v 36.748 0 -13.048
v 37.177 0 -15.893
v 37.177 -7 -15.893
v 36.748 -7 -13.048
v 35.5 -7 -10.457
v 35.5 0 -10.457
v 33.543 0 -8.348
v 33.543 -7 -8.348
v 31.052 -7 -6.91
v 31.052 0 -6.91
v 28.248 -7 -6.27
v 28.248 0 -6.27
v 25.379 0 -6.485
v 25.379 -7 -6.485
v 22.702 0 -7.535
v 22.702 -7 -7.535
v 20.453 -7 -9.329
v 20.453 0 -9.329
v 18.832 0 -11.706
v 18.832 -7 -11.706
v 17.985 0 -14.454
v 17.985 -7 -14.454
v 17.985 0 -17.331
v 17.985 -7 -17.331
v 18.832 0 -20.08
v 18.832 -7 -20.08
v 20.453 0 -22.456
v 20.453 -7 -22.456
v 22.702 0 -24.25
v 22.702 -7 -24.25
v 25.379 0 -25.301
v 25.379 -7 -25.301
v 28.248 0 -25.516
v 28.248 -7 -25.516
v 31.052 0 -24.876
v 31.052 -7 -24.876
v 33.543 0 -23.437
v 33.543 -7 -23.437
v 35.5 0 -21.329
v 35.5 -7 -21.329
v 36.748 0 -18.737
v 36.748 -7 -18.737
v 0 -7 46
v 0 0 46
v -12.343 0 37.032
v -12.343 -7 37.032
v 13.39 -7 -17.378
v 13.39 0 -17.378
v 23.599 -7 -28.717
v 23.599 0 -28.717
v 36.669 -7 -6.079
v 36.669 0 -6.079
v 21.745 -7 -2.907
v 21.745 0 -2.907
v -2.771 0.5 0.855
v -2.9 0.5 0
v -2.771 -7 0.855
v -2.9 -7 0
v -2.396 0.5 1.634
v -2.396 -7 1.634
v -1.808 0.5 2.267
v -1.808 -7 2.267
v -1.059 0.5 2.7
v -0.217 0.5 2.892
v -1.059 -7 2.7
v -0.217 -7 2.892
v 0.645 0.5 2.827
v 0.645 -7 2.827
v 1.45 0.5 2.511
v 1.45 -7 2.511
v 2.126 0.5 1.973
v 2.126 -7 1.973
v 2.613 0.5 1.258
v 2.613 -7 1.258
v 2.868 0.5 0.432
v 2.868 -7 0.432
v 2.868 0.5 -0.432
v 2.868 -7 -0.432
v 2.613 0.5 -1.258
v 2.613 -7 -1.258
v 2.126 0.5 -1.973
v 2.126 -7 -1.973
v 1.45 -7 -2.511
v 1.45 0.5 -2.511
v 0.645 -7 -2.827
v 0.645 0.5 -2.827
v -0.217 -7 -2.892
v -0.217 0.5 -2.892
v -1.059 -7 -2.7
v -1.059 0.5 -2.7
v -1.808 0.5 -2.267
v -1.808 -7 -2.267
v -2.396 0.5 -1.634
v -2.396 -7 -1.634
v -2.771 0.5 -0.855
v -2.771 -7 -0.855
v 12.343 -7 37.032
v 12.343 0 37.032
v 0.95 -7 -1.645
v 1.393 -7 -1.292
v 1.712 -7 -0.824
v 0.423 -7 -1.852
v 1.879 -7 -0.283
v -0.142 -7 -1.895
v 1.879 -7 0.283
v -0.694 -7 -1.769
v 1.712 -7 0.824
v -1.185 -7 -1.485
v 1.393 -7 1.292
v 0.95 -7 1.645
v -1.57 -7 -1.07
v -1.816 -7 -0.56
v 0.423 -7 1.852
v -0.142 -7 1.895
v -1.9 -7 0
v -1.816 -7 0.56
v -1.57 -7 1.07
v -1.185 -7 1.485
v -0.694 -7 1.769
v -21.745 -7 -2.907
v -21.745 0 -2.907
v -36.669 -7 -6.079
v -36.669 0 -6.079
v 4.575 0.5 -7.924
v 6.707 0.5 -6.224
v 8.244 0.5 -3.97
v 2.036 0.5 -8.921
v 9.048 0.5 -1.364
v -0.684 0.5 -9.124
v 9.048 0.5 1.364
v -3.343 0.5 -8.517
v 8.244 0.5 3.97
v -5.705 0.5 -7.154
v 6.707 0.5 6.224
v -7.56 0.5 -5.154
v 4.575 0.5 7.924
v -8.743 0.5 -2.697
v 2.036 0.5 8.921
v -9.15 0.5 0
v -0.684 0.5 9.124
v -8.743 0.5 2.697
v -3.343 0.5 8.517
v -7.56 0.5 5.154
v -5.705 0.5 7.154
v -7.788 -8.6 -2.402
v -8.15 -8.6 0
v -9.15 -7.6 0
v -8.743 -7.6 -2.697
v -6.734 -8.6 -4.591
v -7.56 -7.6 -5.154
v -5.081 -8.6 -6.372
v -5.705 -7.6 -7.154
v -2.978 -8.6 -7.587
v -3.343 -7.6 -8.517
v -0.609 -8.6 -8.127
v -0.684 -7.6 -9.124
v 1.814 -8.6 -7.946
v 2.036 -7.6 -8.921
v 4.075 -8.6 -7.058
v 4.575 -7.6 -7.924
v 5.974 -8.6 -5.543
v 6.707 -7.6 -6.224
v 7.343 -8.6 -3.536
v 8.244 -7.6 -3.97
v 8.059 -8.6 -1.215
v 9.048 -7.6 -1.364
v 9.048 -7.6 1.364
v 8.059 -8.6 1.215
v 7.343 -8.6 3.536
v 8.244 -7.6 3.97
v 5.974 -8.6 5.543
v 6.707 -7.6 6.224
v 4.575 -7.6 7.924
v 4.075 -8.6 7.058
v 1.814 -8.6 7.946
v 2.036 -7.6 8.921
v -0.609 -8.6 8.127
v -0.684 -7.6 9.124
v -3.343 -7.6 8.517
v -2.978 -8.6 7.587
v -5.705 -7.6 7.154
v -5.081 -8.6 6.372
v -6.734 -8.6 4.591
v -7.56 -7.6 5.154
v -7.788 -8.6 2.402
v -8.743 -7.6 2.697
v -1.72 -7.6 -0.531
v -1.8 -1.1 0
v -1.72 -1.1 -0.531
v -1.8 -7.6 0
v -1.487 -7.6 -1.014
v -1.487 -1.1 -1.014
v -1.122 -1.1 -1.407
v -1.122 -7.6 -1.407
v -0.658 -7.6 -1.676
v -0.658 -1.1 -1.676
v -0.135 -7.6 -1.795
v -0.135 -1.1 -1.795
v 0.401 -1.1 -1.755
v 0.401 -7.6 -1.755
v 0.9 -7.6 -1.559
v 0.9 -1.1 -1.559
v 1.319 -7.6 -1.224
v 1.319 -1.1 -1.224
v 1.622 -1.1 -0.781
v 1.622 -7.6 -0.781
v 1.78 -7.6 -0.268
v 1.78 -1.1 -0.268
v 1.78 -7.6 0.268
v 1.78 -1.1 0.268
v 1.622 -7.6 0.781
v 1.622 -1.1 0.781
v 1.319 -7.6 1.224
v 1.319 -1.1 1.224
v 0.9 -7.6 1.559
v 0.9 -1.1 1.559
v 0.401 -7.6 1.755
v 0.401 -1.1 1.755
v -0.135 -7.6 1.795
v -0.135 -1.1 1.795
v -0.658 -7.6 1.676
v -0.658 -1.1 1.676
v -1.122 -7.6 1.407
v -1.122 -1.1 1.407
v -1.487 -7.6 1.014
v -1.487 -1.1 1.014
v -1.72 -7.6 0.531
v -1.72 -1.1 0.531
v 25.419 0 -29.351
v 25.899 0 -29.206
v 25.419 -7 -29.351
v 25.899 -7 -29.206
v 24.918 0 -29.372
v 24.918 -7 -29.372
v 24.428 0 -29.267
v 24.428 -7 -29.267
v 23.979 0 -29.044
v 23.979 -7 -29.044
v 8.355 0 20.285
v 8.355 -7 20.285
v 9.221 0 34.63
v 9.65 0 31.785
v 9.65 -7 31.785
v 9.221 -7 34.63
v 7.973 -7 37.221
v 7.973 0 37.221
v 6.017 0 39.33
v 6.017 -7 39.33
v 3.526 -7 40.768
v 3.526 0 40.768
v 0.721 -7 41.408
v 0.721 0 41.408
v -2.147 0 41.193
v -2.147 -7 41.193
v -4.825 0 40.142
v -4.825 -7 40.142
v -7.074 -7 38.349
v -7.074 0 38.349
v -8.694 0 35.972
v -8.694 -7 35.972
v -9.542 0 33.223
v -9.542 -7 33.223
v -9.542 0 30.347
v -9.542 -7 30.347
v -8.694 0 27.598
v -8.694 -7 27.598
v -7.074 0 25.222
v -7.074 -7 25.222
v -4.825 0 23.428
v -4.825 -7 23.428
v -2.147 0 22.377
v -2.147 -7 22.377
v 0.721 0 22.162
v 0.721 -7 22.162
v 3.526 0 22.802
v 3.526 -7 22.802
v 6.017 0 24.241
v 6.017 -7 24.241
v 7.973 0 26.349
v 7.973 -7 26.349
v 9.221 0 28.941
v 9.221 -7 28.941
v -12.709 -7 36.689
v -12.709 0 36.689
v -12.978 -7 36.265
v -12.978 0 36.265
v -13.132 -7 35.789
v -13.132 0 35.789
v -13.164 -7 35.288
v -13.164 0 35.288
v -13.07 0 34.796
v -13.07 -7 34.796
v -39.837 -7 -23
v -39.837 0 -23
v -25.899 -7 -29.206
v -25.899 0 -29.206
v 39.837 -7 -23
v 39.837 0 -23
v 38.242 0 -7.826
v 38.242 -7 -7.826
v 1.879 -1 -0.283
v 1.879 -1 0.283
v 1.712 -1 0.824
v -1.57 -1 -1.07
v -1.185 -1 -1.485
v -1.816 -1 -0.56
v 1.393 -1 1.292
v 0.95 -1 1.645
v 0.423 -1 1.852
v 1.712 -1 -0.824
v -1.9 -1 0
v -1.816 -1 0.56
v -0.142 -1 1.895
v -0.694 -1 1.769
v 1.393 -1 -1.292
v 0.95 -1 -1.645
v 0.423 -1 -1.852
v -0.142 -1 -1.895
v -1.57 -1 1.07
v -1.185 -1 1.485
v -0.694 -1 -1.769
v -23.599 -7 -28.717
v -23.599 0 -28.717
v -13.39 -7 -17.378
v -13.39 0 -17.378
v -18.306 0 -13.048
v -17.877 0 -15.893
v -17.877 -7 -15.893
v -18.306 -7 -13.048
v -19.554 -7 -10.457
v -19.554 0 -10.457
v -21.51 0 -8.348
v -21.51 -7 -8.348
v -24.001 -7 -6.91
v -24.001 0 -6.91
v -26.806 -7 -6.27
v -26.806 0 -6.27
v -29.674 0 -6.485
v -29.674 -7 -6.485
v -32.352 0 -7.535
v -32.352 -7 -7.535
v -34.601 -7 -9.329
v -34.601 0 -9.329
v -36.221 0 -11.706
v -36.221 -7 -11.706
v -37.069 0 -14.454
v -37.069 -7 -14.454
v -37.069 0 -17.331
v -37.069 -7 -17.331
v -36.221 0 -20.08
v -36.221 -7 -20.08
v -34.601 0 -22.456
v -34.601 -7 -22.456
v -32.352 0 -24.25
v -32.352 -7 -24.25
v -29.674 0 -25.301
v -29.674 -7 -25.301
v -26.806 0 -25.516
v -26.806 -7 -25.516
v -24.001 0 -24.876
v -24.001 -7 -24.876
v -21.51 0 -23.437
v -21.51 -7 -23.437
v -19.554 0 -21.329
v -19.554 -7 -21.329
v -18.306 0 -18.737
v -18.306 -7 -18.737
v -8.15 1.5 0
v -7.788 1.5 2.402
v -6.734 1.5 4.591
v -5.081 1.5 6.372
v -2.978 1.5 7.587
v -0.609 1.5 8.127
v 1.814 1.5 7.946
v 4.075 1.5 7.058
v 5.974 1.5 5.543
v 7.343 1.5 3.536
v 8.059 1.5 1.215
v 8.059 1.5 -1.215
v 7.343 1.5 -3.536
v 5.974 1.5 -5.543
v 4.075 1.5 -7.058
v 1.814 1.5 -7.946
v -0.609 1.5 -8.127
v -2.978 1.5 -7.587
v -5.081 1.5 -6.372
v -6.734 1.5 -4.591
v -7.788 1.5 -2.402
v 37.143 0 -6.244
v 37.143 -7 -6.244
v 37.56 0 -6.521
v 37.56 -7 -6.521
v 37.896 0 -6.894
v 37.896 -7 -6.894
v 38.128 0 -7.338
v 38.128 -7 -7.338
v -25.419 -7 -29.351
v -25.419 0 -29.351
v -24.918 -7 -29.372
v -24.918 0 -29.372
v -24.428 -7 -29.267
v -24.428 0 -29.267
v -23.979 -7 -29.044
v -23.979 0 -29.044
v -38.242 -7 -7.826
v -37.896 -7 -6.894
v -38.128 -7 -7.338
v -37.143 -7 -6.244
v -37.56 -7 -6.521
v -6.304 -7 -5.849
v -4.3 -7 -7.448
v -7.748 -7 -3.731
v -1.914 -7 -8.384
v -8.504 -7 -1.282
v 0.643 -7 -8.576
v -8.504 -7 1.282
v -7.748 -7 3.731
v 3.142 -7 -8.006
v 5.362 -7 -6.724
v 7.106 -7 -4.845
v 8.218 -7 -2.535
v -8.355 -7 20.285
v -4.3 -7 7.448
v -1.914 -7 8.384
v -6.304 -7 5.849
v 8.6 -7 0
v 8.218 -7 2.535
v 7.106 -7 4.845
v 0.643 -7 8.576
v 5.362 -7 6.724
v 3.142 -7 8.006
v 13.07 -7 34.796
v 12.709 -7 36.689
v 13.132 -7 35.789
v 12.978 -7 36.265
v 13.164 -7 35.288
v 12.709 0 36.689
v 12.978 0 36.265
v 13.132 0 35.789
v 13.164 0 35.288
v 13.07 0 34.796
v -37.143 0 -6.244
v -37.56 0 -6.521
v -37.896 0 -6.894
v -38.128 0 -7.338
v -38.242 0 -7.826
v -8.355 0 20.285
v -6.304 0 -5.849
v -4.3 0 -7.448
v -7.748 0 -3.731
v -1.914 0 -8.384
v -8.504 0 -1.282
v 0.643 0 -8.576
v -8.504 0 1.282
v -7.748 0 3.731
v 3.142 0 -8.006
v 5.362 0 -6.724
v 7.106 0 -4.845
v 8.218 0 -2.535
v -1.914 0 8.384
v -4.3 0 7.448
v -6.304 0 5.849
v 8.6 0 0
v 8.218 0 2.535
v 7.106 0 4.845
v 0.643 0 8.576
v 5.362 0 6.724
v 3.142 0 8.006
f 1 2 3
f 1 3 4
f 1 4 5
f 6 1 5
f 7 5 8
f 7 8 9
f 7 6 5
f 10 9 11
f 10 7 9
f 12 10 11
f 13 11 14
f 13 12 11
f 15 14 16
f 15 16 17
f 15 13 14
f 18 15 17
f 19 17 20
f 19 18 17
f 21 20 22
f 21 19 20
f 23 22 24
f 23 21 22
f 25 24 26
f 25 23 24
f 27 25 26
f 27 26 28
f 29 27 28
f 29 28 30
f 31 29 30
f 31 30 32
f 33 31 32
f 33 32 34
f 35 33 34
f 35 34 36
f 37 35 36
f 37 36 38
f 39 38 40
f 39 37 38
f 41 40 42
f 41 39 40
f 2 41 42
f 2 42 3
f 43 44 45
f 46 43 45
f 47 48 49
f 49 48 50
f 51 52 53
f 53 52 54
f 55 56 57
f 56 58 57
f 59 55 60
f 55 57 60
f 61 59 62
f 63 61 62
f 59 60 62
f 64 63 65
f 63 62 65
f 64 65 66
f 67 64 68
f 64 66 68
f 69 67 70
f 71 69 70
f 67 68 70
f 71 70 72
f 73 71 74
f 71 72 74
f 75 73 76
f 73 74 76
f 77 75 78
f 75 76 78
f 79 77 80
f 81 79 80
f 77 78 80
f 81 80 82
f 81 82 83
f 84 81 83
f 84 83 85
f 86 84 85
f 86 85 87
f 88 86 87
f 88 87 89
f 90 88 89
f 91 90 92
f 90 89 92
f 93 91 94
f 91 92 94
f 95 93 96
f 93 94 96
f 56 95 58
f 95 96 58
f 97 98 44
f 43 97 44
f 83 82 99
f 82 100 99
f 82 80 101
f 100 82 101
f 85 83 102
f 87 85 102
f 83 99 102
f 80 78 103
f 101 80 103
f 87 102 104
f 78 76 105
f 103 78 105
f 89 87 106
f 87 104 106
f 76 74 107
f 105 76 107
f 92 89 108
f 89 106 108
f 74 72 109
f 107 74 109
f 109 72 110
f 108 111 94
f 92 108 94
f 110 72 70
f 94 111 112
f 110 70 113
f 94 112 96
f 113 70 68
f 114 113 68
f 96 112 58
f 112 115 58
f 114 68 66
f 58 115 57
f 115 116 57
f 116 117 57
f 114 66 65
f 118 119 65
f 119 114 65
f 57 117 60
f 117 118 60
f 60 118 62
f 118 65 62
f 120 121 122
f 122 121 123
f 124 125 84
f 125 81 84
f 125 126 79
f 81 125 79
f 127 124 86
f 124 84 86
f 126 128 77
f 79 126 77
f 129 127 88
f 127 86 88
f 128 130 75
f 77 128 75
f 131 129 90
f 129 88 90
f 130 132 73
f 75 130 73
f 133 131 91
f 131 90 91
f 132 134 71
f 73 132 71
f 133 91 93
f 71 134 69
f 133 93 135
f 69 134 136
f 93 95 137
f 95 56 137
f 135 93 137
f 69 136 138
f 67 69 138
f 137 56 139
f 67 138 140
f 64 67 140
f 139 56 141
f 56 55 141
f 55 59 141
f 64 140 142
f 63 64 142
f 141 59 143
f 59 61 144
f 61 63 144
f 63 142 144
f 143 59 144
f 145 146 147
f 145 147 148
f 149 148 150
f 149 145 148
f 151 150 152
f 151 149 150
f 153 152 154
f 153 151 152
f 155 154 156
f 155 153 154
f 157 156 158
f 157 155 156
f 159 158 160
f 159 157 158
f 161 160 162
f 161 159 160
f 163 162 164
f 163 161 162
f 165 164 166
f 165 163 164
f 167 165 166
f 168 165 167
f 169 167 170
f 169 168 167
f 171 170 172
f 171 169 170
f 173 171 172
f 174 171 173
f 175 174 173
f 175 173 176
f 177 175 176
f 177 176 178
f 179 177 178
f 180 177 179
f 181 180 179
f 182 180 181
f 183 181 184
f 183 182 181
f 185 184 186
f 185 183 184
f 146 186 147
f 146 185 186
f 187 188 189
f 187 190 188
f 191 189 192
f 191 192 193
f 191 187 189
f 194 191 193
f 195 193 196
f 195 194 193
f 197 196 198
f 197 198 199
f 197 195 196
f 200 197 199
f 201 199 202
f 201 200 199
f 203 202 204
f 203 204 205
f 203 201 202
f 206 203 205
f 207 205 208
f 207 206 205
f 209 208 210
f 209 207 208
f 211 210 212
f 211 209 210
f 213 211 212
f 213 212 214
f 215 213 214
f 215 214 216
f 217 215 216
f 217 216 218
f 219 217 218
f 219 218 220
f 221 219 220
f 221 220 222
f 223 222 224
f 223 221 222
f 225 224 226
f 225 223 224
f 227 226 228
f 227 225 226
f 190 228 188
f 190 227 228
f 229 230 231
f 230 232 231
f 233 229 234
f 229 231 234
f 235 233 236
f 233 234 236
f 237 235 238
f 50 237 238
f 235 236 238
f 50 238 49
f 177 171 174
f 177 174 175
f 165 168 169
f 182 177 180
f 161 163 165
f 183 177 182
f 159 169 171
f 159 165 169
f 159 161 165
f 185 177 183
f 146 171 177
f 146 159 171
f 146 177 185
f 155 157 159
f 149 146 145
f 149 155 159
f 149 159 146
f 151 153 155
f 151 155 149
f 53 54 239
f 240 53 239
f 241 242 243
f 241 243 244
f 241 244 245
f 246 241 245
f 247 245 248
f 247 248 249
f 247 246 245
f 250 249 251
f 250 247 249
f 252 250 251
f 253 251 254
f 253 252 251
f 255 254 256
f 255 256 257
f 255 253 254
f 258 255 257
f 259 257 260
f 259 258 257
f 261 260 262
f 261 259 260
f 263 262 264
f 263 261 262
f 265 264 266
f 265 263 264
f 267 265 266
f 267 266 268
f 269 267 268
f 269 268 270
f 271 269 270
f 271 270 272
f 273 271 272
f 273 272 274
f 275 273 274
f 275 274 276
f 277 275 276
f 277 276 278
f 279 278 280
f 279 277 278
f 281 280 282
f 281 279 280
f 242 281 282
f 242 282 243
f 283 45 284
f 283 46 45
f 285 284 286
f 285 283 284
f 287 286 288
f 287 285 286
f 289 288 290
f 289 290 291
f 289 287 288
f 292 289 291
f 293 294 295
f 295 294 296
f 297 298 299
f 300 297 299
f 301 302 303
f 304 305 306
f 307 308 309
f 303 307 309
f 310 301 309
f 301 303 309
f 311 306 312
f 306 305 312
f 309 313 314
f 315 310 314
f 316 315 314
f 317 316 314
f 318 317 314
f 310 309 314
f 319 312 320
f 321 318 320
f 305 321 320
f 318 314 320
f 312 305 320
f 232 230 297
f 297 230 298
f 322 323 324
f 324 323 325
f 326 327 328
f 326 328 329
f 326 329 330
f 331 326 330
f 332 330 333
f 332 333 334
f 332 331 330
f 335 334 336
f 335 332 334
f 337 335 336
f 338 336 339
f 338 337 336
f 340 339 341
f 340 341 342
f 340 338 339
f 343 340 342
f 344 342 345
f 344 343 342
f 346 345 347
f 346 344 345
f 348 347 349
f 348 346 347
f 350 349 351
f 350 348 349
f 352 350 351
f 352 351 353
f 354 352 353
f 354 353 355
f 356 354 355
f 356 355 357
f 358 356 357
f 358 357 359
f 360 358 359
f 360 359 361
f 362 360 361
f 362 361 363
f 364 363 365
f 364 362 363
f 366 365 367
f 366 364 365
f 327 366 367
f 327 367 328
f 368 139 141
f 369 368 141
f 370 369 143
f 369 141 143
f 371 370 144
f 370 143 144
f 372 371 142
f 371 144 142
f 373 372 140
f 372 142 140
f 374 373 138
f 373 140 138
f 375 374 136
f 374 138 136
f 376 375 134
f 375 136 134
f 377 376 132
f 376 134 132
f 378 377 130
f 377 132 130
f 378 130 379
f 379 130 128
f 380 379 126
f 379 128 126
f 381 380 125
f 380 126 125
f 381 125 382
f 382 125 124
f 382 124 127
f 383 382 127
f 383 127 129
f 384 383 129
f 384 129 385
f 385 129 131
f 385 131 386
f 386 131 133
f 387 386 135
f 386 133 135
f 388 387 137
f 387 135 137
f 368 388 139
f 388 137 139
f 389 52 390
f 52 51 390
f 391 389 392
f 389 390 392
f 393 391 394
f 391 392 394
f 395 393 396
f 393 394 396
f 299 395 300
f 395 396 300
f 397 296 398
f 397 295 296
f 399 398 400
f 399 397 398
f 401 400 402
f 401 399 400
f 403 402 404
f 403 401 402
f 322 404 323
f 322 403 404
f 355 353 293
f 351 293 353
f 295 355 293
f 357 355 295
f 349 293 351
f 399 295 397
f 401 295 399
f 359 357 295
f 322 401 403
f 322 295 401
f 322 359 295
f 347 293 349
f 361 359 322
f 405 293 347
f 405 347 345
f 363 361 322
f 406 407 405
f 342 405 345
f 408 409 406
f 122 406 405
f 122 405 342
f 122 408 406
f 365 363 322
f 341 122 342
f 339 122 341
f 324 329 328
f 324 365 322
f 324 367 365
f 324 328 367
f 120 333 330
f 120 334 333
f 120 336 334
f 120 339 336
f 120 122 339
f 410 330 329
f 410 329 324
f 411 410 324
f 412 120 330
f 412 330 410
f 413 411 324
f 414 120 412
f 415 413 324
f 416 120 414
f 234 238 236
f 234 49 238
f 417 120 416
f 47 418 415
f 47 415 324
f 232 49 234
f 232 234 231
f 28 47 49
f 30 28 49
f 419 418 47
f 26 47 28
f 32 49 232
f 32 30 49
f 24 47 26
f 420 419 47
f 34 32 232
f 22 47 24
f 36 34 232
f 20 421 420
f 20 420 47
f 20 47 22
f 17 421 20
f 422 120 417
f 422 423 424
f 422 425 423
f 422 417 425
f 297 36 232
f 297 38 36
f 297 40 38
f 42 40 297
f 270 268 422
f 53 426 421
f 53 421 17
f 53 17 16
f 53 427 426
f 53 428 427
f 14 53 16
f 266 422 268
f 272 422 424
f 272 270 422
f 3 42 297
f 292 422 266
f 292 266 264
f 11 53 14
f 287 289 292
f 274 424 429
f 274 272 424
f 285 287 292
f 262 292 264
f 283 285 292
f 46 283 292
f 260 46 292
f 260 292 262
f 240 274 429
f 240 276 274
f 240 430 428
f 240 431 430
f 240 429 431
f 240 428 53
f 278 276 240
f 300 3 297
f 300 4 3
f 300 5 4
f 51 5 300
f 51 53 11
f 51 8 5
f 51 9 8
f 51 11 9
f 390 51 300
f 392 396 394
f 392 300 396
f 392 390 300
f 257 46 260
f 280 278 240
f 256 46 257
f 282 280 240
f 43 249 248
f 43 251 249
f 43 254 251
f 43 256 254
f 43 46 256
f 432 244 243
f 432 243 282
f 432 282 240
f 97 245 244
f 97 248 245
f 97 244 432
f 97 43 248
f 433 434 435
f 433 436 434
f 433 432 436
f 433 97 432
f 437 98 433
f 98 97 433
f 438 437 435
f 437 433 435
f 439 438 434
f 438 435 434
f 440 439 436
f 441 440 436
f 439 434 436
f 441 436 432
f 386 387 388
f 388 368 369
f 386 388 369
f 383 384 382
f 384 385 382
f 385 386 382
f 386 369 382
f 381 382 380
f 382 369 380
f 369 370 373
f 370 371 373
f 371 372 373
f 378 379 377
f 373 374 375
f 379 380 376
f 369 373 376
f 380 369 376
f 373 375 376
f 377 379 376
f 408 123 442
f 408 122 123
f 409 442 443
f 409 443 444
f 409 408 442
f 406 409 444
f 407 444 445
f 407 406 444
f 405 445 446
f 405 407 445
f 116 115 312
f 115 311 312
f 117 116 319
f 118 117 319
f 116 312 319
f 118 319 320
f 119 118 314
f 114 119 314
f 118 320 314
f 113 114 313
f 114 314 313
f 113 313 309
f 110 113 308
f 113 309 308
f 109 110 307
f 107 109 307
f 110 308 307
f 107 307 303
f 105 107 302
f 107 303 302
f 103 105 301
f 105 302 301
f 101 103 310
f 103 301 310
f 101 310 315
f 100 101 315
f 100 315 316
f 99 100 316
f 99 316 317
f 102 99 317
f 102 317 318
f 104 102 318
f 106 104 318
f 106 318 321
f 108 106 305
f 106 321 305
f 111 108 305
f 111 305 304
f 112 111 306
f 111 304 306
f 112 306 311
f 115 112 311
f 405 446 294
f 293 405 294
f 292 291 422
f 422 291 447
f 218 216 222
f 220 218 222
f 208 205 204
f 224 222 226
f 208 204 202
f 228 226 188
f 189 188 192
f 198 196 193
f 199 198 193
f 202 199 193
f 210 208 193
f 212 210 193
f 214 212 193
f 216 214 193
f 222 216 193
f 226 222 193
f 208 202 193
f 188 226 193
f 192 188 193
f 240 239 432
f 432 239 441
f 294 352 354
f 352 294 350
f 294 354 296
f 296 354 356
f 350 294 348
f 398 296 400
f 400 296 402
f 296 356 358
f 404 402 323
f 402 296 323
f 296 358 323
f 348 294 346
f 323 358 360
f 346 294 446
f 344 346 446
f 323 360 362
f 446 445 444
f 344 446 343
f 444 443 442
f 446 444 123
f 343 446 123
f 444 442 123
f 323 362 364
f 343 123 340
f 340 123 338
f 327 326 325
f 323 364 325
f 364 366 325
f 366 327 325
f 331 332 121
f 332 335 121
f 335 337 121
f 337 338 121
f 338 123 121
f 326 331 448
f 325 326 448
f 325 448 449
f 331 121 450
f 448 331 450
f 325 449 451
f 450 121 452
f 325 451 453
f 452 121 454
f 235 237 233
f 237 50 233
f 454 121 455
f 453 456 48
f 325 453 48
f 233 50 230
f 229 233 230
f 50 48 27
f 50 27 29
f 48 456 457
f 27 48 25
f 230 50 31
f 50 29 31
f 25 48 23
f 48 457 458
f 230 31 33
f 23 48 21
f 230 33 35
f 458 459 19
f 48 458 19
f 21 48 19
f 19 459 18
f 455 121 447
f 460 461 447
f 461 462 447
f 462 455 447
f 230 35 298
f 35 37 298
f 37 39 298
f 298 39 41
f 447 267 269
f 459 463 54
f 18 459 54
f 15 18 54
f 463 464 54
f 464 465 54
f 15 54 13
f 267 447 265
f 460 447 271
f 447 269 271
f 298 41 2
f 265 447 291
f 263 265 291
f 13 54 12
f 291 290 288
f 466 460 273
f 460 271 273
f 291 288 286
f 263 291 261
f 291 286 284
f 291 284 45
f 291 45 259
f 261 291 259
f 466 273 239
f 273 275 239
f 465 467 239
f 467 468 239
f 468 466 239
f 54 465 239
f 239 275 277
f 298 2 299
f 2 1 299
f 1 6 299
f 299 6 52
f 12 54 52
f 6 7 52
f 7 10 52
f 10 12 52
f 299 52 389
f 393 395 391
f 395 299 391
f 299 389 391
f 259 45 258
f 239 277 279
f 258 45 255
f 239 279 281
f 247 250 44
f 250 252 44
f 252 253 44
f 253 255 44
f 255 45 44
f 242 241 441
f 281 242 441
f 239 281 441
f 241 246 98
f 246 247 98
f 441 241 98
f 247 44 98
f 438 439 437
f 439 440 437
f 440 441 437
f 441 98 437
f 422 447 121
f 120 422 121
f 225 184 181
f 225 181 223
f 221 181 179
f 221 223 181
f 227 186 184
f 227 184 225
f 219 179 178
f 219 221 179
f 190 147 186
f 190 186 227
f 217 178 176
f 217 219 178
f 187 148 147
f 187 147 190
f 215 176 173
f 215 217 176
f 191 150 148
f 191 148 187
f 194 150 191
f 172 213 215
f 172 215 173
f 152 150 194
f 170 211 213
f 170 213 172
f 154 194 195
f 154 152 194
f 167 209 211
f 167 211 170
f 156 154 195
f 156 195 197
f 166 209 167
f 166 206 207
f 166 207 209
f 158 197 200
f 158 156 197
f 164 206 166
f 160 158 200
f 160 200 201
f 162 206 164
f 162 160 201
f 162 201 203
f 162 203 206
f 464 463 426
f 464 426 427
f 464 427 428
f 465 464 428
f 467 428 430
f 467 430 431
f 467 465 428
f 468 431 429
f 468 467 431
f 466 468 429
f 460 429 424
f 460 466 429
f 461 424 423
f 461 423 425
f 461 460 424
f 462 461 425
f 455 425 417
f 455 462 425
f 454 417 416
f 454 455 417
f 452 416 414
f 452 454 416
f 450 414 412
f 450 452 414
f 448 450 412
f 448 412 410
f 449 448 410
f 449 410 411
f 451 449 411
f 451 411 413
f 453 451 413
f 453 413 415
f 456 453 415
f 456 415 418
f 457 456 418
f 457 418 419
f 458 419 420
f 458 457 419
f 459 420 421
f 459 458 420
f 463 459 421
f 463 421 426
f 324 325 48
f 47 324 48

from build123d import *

# Parameters (mm, degrees)
F0_R     = 9.65
F0_R_2   = 8.6
F1_DEPTH = 7
F2_R     = 2
F3_R     = 2
F6_SIZE  = 0.99999
F7_W     = 1.8
F7_H     = 5.9
F9_SIZE  = 0.99999


# Not quite as in the source:
# - a fillet or chamfer is up to 0.001 mm smaller than in the source, because OpenCascade refuses the exact size


with BuildPart() as f1:
    # F0 (on Front) → F1 (new body)
    with BuildSketch(Plane.XZ):
        Polygon((21.7451338694, -2.9067598383), (8.3552390721, 20.2852182588), (-8.3552390721, 20.2852182588), (-21.7451338694, -2.9067598383), (-38.0904479732, -6.3810636036), (-39.8371685741, -23), (-24.5713871705, -29.7967637845), (-13.3898947974, -17.3784584205), (13.3898947974, -17.3784584205), (24.5713871705, -29.7967637845), (39.8371685741, -23), (38.0904479732, -6.3810636036), align=None)
        with Locations((-27.5268064769, -15.8926091294)):
            Circle(F0_R, mode=Mode.SUBTRACT)
        with Locations((27.5268064769, -15.8926091294)):
            Circle(F0_R, mode=Mode.SUBTRACT)
        with BuildLine():
            Line((-13.9218488041, 8.0377831547), (-13.0164978485, 9.3043421992))
            ThreePointArc((-13.0164978485, 9.3043421992), (0, 16), (13.0164978485, 9.3043421992))
            Line((13.0164978485, 9.3043421992), (13.9218488041, 8.0377831547))
            Line((13.9218488041, 8.0377831547), (14.5660456343, 6.6204467055))
            ThreePointArc((14.5660456343, 6.6204467055), (15.6374027599, 3.3869802075), (16, 0))
            ThreePointArc((16, 0), (11.8488979355, -10.7519122817), (1.5495477858, -15.9247889047))
            Line((1.5495477858, -15.9247889047), (0, -16.0755663093))
            Line((0, -16.0755663093), (-1.5495477858, -15.9247889047))
            ThreePointArc((-1.5495477858, -15.9247889047), (-13.8564064606, -8), (-14.5660456343, 6.6204467055))
            Line((-14.5660456343, 6.6204467055), (-13.9218488041, 8.0377831547))
        make_face(mode=Mode.SUBTRACT)
        with BuildLine():
            ThreePointArc((13.0164978485, 9.3043421992), (0, 16), (-13.0164978485, 9.3043421992))
            ThreePointArc((-13.0164978485, 9.3043421992), (-13.8564064606, 8), (-14.5660456343, 6.6204467055))
            ThreePointArc((-14.5660456343, 6.6204467055), (-13.8564064606, -8), (-1.5495477858, -15.9247889047))
            ThreePointArc((-1.5495477858, -15.9247889047), (0, -16), (1.5495477858, -15.9247889047))
            ThreePointArc((1.5495477858, -15.9247889047), (11.8488979355, -10.7519122817), (16, 0))
            ThreePointArc((16, 0), (15.6374027599, 3.3869802075), (14.5660456343, 6.6204467055))
            ThreePointArc((14.5660456343, 6.6204467055), (13.8564064606, 8), (13.0164978485, 9.3043421992))
        make_face()
        Circle(F0_R_2, mode=Mode.SUBTRACT)
        Polygon((8.3552390721, 20.2852182588), (13.5190608027, 36.1778273881), (0, 46), (-13.5190608027, 36.1778273881), (-8.3552390721, 20.2852182588), align=None)
        with Locations((0, 31.7852182588)):
            Circle(F0_R, mode=Mode.SUBTRACT)
        with BuildLine():
            ThreePointArc((-14.5660456343, 6.6204467055), (-13.8564064606, 8), (-13.0164978485, 9.3043421992))
            Line((-13.0164978485, 9.3043421992), (-13.9218488041, 8.0377831547))
            Line((-13.9218488041, 8.0377831547), (-14.5660456343, 6.6204467055))
        make_face()
        with BuildLine():
            Line((13.9218488041, 8.0377831547), (13.0164978485, 9.3043421992))
            ThreePointArc((13.0164978485, 9.3043421992), (13.8564064606, 8), (14.5660456343, 6.6204467055))
            Line((14.5660456343, 6.6204467055), (13.9218488041, 8.0377831547))
        make_face()
        with BuildLine():
            ThreePointArc((1.5495477858, -15.9247889047), (0, -16), (-1.5495477858, -15.9247889047))
            Line((-1.5495477858, -15.9247889047), (0, -16.0755663093))
            Line((0, -16.0755663093), (1.5495477858, -15.9247889047))
        make_face()
    extrude(amount=F1_DEPTH)

    # F2
    f2_edges = [f1.edges().sort_by_distance(p)[0] for p in [
        (-13.519061, -3.5, 36.177827),
    ]]
    fillet(f2_edges, radius=F2_R)

    # F3
    f3_edges = [f1.edges().sort_by_distance(p)[0] for p in [
        (13.519061, -3.5, 36.177827),
        (38.090448, -3.5, -6.381064),
        (24.571387, -3.5, -29.796764),
        (-38.090448, -3.5, -6.381064),
        (-24.571387, -3.5, -29.796764),
    ]]
    fillet(f3_edges, radius=F3_R)


with BuildPart() as f5:
    # F4 (on Top) → F5 (revolve)
    with BuildSketch(Plane.XY):
        Polygon((-2.9, 0.5), (-2.9, 0), (-2.9, -7), (-1.9, -7), (-1.9, -1), (0, -1), (0, 1.5), (-9.15, 1.5), (-9.15, 0.5), align=None)
    revolve(axis=Axis((0, 0.25, 0), (0, 1, 0)))

    # F6 (size 1 in the source; OpenCascade refuses exactly that, so slightly less here)
    f6_edges = [f5.edges().sort_by_distance(p)[0] for p in [
        (9.15, 1.5, 0),
    ]]
    chamfer(f6_edges, length=F6_SIZE)


with BuildPart() as f8:
    # F7 (on Top) → F8 (revolve)
    with BuildSketch(Plane.XY):
        Polygon((0, -8.6), (0, -7), (-1.8, -7), (-1.8, -7.6), (-9.15, -7.6), (-9.15, -8.6), align=None)
        with Locations((-0.9, -4.05)):
            Rectangle(F7_W, F7_H)
    revolve(axis=Axis((0, -4.85, 0), (0, -1, 0)))

    # F9 (size 1 in the source; OpenCascade refuses exactly that, so slightly less here)
    f9_edges = [f8.edges().sort_by_distance(p)[0] for p in [
        (9.15, -8.6, 0),
    ]]
    chamfer(f9_edges, length=F9_SIZE)


solid = Compound([f1.part, f5.part, f8.part])
